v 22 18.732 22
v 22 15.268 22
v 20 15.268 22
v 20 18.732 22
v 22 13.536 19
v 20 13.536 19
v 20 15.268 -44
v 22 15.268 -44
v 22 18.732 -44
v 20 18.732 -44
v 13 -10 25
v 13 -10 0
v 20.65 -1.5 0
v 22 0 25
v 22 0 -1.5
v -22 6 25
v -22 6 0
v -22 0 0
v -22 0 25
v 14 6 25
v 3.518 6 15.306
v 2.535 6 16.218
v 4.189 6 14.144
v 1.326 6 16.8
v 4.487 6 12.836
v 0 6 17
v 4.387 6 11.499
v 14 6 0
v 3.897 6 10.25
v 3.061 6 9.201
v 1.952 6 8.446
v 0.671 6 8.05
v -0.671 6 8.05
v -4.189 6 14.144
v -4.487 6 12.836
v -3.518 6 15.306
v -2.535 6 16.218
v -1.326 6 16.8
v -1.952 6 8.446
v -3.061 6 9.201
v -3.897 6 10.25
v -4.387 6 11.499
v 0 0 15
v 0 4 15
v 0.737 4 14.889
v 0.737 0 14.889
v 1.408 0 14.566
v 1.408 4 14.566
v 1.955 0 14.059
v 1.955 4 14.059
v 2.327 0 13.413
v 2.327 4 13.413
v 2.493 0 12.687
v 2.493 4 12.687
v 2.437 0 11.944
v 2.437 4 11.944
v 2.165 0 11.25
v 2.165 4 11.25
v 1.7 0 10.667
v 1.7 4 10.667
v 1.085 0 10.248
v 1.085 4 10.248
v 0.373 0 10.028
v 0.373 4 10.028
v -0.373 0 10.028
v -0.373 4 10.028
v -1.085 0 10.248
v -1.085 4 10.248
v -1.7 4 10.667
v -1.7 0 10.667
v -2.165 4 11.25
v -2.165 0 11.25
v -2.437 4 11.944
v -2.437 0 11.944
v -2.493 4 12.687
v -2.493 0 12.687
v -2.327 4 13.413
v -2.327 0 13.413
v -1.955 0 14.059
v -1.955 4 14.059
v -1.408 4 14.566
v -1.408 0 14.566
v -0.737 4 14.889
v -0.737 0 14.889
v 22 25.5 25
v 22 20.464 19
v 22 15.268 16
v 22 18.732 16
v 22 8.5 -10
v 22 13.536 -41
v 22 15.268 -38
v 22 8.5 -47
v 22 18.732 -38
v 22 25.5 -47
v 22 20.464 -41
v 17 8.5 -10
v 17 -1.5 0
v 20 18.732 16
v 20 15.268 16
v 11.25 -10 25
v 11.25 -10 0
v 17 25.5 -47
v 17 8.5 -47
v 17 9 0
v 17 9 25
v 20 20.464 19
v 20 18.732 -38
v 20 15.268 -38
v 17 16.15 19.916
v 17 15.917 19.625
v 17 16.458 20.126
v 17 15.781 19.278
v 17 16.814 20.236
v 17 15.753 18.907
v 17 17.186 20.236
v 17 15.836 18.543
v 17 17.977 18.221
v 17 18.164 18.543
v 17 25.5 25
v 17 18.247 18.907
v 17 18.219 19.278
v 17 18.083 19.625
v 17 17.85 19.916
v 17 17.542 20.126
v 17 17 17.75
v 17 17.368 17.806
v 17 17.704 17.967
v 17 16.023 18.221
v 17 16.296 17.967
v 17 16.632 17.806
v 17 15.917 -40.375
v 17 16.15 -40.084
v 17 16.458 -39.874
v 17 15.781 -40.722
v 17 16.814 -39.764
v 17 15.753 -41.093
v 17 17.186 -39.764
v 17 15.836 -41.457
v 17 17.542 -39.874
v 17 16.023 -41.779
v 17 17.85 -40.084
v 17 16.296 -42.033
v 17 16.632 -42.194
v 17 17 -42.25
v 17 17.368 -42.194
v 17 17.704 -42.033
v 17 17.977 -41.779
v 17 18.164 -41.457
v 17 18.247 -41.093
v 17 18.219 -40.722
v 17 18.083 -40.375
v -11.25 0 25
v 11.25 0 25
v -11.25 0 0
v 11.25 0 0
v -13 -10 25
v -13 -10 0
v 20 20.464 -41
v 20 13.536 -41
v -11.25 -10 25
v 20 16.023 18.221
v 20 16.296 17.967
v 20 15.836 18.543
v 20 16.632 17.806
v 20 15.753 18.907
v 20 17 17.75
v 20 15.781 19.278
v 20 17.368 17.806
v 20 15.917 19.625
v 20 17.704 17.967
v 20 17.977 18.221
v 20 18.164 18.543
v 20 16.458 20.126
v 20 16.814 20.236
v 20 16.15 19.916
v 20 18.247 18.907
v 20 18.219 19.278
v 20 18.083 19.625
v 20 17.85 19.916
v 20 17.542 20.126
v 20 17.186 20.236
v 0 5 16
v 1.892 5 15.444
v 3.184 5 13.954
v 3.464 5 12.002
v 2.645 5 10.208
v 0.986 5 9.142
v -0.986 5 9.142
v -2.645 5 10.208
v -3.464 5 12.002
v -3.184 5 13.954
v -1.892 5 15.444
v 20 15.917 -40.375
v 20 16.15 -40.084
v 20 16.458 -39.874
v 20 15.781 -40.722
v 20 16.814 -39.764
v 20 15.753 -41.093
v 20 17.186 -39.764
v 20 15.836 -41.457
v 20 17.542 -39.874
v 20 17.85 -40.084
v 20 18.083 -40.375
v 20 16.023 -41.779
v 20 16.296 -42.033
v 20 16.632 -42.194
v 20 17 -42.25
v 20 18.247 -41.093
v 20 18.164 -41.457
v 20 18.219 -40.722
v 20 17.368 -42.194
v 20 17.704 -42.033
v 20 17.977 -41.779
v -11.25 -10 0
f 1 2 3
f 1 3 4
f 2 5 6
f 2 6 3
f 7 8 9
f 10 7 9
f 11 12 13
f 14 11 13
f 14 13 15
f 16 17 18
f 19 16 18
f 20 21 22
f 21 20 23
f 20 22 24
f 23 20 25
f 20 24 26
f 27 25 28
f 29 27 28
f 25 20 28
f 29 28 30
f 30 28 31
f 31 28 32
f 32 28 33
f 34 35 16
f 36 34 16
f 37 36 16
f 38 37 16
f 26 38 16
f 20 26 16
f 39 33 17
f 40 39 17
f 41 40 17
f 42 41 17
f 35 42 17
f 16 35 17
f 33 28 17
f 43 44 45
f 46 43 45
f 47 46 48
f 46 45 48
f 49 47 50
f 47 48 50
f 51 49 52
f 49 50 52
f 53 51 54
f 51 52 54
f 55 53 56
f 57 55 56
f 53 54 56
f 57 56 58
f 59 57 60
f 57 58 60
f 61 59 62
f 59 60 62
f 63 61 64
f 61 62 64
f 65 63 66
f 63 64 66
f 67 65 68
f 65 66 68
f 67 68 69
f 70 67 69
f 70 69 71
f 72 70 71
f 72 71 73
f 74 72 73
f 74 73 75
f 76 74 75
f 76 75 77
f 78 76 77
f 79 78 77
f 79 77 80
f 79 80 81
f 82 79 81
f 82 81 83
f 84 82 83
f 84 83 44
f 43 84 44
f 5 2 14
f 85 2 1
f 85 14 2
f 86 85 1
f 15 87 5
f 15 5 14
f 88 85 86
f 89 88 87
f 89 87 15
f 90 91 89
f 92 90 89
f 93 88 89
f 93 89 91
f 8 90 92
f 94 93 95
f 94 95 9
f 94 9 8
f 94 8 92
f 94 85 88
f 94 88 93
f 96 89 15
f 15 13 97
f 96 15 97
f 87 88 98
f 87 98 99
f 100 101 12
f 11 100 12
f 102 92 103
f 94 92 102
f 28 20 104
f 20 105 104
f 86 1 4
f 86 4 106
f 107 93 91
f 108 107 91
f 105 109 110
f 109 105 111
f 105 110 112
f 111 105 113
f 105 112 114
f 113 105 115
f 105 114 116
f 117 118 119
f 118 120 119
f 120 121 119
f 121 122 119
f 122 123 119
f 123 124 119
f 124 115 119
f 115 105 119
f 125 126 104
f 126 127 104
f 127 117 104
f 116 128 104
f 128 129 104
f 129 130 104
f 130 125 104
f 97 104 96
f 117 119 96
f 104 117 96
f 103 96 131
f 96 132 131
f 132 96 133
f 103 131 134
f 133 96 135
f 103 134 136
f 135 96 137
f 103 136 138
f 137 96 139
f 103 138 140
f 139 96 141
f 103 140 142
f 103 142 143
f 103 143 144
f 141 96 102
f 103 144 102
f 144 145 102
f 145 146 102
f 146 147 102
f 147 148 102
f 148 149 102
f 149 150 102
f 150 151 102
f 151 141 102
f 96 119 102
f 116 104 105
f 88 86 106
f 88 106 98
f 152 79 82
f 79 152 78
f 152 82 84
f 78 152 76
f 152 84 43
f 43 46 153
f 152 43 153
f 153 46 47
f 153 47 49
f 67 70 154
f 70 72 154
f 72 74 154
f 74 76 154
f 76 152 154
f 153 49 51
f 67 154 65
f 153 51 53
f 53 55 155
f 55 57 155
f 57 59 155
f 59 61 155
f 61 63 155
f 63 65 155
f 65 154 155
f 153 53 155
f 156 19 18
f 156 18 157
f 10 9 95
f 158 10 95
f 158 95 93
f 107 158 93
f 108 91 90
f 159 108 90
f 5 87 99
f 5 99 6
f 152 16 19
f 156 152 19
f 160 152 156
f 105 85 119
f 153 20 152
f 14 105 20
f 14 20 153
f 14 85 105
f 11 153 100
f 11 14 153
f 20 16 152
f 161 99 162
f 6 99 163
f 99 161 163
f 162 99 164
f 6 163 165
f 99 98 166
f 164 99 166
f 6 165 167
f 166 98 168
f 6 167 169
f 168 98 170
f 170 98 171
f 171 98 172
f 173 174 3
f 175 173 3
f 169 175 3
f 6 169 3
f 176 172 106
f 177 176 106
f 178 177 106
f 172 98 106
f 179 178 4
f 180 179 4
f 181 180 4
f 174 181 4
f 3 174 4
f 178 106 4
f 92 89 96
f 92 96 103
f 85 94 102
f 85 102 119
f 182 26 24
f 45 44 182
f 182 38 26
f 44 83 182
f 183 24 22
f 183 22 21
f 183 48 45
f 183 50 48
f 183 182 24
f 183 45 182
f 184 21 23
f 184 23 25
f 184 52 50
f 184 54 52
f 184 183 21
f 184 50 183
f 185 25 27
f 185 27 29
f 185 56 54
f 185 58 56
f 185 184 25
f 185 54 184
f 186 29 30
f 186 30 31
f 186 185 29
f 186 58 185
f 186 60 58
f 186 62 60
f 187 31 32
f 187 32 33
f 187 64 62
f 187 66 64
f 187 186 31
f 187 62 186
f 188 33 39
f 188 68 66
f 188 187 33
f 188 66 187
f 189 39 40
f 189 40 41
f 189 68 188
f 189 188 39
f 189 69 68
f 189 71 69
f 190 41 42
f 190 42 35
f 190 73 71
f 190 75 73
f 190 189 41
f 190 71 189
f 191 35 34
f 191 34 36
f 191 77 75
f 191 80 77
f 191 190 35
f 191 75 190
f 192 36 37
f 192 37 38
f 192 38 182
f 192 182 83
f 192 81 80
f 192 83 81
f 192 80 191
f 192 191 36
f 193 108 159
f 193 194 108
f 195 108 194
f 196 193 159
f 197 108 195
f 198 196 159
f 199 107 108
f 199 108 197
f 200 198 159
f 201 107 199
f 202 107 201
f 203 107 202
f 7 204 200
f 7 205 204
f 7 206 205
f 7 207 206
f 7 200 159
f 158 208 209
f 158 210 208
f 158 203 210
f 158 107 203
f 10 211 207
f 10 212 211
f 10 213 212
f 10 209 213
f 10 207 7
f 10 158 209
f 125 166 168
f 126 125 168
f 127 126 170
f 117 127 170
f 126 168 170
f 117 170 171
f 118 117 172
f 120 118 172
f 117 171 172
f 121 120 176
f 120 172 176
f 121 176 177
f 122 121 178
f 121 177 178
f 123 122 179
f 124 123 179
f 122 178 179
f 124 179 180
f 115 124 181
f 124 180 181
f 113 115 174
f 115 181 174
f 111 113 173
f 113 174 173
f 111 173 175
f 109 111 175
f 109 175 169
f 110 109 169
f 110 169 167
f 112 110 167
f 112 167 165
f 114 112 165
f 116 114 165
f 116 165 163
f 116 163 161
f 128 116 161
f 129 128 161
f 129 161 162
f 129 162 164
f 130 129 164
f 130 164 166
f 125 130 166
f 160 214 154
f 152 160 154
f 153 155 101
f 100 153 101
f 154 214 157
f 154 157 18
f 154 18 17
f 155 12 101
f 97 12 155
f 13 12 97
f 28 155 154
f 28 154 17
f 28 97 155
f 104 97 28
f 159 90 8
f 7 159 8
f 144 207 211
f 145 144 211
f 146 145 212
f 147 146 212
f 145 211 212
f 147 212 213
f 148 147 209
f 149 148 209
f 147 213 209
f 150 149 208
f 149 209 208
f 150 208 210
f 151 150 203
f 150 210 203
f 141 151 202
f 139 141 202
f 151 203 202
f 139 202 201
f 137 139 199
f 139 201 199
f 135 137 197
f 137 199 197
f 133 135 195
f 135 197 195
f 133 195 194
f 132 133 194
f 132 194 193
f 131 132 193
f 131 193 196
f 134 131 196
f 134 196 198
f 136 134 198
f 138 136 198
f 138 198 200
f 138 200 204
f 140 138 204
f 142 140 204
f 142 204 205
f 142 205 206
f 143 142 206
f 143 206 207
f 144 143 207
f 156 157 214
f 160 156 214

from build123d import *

# Parameters (mm, degrees)
BOSS_EXTRUDE1_DEPTH = 25
SKETCH2_R           = 1.25
BOSS_EXTRUDE2_DEPTH = 5
SKETCH3_R           = 2.5
CUT_EXTRUDE1_DEPTH  = 56.436901068
CHAMFER1_SIZE       = 2
CUT_EXTRUDE2_DEPTH  = 2
CHAMFER2_SIZE       = 3
SKETCH5_W           = 0.5
SKETCH5_H           = 47
CUT_EXTRUDE3_DEPTH  = 56.093103017
CHAMFER3_SIZE       = 10


with BuildPart() as part:
    # Sketch1 → Boss-Extrude1 (new body)
    with BuildSketch(Plane.XY):
        Polygon((-11.25, 0), (11.25, 0), (11.25, -10), (13, -10), (22, 0), (22, 6), (-22, 6), (-22, 0), (-13, -10), (-11.25, -10), align=None)
    extrude(amount=BOSS_EXTRUDE1_DEPTH)

    # Sketch2 → Boss-Extrude2 (add)
    with BuildSketch(Plane(origin=(22, 0, 0), x_dir=(0, 0, -1), z_dir=(1, 0, 0))):
        Polygon((-25, 6), (0, 6), (0, 8.5), (47, 8.5), (47, 25.5), (-25, 25.5), align=None)
        with Locations((-19, 17)):
            Circle(SKETCH2_R, mode=Mode.SUBTRACT)
        with Locations((41, 17)):
            Circle(SKETCH2_R, mode=Mode.SUBTRACT)
    extrude(amount=-BOSS_EXTRUDE2_DEPTH)

    # Sketch3 → Cut-Extrude1 (cut, through all)
    with BuildSketch(Plane(origin=(0, 6, 0), x_dir=(1, 0, 0), z_dir=(0, 1, 0))):
        with Locations(Location((0, -12.5, 0), (0, 0, 270))):
            Circle(SKETCH3_R)
    extrude(amount=-CUT_EXTRUDE1_DEPTH, mode=Mode.SUBTRACT)

    # Chamfer1
    chamfer1_edges = [part.edges().sort_by_distance(p)[0] for p in [
        (0, 6, 10),
    ]]
    chamfer(chamfer1_edges, length=CHAMFER1_SIZE)

    # Sketch4 → Cut-Extrude2 (cut)
    with BuildSketch(Plane(origin=(22, 0, 0), x_dir=(0, 0, -1), z_dir=(1, 0, 0))):
        Polygon((-16, 18.732050808), (-16, 15.267949192), (-19, 13.535898385), (-22, 15.267949192), (-22, 18.732050808), (-19, 20.464101615), align=None)
    cut_extrude2 = extrude(amount=-CUT_EXTRUDE2_DEPTH, mode=Mode.SUBTRACT)

    # Mirror1: Cut-Extrude2 across plane
    add(cut_extrude2.mirror(Plane.XY.offset(-11)), mode=Mode.SUBTRACT)

    # Chamfer2
    chamfer2_edges = [part.edges().sort_by_distance(p)[0] for p in [
        (17, 6, 12.5),
    ]]
    chamfer(chamfer2_edges, length=CHAMFER2_SIZE)

    # Sketch5 → Cut-Extrude3 (cut, through all)
    with BuildSketch(Plane.XZ.offset(-8.5)):
        with Locations((16.75, -23.5)):
            Rectangle(SKETCH5_W, SKETCH5_H)
    extrude(amount=-CUT_EXTRUDE3_DEPTH, mode=Mode.SUBTRACT)

    # Chamfer3
    chamfer3_edges = [part.edges().sort_by_distance(p)[0] for p in [
        (19.5, 8.5, 0),
    ]]
    chamfer(chamfer3_edges, length=CHAMFER3_SIZE)


solid = part.part
